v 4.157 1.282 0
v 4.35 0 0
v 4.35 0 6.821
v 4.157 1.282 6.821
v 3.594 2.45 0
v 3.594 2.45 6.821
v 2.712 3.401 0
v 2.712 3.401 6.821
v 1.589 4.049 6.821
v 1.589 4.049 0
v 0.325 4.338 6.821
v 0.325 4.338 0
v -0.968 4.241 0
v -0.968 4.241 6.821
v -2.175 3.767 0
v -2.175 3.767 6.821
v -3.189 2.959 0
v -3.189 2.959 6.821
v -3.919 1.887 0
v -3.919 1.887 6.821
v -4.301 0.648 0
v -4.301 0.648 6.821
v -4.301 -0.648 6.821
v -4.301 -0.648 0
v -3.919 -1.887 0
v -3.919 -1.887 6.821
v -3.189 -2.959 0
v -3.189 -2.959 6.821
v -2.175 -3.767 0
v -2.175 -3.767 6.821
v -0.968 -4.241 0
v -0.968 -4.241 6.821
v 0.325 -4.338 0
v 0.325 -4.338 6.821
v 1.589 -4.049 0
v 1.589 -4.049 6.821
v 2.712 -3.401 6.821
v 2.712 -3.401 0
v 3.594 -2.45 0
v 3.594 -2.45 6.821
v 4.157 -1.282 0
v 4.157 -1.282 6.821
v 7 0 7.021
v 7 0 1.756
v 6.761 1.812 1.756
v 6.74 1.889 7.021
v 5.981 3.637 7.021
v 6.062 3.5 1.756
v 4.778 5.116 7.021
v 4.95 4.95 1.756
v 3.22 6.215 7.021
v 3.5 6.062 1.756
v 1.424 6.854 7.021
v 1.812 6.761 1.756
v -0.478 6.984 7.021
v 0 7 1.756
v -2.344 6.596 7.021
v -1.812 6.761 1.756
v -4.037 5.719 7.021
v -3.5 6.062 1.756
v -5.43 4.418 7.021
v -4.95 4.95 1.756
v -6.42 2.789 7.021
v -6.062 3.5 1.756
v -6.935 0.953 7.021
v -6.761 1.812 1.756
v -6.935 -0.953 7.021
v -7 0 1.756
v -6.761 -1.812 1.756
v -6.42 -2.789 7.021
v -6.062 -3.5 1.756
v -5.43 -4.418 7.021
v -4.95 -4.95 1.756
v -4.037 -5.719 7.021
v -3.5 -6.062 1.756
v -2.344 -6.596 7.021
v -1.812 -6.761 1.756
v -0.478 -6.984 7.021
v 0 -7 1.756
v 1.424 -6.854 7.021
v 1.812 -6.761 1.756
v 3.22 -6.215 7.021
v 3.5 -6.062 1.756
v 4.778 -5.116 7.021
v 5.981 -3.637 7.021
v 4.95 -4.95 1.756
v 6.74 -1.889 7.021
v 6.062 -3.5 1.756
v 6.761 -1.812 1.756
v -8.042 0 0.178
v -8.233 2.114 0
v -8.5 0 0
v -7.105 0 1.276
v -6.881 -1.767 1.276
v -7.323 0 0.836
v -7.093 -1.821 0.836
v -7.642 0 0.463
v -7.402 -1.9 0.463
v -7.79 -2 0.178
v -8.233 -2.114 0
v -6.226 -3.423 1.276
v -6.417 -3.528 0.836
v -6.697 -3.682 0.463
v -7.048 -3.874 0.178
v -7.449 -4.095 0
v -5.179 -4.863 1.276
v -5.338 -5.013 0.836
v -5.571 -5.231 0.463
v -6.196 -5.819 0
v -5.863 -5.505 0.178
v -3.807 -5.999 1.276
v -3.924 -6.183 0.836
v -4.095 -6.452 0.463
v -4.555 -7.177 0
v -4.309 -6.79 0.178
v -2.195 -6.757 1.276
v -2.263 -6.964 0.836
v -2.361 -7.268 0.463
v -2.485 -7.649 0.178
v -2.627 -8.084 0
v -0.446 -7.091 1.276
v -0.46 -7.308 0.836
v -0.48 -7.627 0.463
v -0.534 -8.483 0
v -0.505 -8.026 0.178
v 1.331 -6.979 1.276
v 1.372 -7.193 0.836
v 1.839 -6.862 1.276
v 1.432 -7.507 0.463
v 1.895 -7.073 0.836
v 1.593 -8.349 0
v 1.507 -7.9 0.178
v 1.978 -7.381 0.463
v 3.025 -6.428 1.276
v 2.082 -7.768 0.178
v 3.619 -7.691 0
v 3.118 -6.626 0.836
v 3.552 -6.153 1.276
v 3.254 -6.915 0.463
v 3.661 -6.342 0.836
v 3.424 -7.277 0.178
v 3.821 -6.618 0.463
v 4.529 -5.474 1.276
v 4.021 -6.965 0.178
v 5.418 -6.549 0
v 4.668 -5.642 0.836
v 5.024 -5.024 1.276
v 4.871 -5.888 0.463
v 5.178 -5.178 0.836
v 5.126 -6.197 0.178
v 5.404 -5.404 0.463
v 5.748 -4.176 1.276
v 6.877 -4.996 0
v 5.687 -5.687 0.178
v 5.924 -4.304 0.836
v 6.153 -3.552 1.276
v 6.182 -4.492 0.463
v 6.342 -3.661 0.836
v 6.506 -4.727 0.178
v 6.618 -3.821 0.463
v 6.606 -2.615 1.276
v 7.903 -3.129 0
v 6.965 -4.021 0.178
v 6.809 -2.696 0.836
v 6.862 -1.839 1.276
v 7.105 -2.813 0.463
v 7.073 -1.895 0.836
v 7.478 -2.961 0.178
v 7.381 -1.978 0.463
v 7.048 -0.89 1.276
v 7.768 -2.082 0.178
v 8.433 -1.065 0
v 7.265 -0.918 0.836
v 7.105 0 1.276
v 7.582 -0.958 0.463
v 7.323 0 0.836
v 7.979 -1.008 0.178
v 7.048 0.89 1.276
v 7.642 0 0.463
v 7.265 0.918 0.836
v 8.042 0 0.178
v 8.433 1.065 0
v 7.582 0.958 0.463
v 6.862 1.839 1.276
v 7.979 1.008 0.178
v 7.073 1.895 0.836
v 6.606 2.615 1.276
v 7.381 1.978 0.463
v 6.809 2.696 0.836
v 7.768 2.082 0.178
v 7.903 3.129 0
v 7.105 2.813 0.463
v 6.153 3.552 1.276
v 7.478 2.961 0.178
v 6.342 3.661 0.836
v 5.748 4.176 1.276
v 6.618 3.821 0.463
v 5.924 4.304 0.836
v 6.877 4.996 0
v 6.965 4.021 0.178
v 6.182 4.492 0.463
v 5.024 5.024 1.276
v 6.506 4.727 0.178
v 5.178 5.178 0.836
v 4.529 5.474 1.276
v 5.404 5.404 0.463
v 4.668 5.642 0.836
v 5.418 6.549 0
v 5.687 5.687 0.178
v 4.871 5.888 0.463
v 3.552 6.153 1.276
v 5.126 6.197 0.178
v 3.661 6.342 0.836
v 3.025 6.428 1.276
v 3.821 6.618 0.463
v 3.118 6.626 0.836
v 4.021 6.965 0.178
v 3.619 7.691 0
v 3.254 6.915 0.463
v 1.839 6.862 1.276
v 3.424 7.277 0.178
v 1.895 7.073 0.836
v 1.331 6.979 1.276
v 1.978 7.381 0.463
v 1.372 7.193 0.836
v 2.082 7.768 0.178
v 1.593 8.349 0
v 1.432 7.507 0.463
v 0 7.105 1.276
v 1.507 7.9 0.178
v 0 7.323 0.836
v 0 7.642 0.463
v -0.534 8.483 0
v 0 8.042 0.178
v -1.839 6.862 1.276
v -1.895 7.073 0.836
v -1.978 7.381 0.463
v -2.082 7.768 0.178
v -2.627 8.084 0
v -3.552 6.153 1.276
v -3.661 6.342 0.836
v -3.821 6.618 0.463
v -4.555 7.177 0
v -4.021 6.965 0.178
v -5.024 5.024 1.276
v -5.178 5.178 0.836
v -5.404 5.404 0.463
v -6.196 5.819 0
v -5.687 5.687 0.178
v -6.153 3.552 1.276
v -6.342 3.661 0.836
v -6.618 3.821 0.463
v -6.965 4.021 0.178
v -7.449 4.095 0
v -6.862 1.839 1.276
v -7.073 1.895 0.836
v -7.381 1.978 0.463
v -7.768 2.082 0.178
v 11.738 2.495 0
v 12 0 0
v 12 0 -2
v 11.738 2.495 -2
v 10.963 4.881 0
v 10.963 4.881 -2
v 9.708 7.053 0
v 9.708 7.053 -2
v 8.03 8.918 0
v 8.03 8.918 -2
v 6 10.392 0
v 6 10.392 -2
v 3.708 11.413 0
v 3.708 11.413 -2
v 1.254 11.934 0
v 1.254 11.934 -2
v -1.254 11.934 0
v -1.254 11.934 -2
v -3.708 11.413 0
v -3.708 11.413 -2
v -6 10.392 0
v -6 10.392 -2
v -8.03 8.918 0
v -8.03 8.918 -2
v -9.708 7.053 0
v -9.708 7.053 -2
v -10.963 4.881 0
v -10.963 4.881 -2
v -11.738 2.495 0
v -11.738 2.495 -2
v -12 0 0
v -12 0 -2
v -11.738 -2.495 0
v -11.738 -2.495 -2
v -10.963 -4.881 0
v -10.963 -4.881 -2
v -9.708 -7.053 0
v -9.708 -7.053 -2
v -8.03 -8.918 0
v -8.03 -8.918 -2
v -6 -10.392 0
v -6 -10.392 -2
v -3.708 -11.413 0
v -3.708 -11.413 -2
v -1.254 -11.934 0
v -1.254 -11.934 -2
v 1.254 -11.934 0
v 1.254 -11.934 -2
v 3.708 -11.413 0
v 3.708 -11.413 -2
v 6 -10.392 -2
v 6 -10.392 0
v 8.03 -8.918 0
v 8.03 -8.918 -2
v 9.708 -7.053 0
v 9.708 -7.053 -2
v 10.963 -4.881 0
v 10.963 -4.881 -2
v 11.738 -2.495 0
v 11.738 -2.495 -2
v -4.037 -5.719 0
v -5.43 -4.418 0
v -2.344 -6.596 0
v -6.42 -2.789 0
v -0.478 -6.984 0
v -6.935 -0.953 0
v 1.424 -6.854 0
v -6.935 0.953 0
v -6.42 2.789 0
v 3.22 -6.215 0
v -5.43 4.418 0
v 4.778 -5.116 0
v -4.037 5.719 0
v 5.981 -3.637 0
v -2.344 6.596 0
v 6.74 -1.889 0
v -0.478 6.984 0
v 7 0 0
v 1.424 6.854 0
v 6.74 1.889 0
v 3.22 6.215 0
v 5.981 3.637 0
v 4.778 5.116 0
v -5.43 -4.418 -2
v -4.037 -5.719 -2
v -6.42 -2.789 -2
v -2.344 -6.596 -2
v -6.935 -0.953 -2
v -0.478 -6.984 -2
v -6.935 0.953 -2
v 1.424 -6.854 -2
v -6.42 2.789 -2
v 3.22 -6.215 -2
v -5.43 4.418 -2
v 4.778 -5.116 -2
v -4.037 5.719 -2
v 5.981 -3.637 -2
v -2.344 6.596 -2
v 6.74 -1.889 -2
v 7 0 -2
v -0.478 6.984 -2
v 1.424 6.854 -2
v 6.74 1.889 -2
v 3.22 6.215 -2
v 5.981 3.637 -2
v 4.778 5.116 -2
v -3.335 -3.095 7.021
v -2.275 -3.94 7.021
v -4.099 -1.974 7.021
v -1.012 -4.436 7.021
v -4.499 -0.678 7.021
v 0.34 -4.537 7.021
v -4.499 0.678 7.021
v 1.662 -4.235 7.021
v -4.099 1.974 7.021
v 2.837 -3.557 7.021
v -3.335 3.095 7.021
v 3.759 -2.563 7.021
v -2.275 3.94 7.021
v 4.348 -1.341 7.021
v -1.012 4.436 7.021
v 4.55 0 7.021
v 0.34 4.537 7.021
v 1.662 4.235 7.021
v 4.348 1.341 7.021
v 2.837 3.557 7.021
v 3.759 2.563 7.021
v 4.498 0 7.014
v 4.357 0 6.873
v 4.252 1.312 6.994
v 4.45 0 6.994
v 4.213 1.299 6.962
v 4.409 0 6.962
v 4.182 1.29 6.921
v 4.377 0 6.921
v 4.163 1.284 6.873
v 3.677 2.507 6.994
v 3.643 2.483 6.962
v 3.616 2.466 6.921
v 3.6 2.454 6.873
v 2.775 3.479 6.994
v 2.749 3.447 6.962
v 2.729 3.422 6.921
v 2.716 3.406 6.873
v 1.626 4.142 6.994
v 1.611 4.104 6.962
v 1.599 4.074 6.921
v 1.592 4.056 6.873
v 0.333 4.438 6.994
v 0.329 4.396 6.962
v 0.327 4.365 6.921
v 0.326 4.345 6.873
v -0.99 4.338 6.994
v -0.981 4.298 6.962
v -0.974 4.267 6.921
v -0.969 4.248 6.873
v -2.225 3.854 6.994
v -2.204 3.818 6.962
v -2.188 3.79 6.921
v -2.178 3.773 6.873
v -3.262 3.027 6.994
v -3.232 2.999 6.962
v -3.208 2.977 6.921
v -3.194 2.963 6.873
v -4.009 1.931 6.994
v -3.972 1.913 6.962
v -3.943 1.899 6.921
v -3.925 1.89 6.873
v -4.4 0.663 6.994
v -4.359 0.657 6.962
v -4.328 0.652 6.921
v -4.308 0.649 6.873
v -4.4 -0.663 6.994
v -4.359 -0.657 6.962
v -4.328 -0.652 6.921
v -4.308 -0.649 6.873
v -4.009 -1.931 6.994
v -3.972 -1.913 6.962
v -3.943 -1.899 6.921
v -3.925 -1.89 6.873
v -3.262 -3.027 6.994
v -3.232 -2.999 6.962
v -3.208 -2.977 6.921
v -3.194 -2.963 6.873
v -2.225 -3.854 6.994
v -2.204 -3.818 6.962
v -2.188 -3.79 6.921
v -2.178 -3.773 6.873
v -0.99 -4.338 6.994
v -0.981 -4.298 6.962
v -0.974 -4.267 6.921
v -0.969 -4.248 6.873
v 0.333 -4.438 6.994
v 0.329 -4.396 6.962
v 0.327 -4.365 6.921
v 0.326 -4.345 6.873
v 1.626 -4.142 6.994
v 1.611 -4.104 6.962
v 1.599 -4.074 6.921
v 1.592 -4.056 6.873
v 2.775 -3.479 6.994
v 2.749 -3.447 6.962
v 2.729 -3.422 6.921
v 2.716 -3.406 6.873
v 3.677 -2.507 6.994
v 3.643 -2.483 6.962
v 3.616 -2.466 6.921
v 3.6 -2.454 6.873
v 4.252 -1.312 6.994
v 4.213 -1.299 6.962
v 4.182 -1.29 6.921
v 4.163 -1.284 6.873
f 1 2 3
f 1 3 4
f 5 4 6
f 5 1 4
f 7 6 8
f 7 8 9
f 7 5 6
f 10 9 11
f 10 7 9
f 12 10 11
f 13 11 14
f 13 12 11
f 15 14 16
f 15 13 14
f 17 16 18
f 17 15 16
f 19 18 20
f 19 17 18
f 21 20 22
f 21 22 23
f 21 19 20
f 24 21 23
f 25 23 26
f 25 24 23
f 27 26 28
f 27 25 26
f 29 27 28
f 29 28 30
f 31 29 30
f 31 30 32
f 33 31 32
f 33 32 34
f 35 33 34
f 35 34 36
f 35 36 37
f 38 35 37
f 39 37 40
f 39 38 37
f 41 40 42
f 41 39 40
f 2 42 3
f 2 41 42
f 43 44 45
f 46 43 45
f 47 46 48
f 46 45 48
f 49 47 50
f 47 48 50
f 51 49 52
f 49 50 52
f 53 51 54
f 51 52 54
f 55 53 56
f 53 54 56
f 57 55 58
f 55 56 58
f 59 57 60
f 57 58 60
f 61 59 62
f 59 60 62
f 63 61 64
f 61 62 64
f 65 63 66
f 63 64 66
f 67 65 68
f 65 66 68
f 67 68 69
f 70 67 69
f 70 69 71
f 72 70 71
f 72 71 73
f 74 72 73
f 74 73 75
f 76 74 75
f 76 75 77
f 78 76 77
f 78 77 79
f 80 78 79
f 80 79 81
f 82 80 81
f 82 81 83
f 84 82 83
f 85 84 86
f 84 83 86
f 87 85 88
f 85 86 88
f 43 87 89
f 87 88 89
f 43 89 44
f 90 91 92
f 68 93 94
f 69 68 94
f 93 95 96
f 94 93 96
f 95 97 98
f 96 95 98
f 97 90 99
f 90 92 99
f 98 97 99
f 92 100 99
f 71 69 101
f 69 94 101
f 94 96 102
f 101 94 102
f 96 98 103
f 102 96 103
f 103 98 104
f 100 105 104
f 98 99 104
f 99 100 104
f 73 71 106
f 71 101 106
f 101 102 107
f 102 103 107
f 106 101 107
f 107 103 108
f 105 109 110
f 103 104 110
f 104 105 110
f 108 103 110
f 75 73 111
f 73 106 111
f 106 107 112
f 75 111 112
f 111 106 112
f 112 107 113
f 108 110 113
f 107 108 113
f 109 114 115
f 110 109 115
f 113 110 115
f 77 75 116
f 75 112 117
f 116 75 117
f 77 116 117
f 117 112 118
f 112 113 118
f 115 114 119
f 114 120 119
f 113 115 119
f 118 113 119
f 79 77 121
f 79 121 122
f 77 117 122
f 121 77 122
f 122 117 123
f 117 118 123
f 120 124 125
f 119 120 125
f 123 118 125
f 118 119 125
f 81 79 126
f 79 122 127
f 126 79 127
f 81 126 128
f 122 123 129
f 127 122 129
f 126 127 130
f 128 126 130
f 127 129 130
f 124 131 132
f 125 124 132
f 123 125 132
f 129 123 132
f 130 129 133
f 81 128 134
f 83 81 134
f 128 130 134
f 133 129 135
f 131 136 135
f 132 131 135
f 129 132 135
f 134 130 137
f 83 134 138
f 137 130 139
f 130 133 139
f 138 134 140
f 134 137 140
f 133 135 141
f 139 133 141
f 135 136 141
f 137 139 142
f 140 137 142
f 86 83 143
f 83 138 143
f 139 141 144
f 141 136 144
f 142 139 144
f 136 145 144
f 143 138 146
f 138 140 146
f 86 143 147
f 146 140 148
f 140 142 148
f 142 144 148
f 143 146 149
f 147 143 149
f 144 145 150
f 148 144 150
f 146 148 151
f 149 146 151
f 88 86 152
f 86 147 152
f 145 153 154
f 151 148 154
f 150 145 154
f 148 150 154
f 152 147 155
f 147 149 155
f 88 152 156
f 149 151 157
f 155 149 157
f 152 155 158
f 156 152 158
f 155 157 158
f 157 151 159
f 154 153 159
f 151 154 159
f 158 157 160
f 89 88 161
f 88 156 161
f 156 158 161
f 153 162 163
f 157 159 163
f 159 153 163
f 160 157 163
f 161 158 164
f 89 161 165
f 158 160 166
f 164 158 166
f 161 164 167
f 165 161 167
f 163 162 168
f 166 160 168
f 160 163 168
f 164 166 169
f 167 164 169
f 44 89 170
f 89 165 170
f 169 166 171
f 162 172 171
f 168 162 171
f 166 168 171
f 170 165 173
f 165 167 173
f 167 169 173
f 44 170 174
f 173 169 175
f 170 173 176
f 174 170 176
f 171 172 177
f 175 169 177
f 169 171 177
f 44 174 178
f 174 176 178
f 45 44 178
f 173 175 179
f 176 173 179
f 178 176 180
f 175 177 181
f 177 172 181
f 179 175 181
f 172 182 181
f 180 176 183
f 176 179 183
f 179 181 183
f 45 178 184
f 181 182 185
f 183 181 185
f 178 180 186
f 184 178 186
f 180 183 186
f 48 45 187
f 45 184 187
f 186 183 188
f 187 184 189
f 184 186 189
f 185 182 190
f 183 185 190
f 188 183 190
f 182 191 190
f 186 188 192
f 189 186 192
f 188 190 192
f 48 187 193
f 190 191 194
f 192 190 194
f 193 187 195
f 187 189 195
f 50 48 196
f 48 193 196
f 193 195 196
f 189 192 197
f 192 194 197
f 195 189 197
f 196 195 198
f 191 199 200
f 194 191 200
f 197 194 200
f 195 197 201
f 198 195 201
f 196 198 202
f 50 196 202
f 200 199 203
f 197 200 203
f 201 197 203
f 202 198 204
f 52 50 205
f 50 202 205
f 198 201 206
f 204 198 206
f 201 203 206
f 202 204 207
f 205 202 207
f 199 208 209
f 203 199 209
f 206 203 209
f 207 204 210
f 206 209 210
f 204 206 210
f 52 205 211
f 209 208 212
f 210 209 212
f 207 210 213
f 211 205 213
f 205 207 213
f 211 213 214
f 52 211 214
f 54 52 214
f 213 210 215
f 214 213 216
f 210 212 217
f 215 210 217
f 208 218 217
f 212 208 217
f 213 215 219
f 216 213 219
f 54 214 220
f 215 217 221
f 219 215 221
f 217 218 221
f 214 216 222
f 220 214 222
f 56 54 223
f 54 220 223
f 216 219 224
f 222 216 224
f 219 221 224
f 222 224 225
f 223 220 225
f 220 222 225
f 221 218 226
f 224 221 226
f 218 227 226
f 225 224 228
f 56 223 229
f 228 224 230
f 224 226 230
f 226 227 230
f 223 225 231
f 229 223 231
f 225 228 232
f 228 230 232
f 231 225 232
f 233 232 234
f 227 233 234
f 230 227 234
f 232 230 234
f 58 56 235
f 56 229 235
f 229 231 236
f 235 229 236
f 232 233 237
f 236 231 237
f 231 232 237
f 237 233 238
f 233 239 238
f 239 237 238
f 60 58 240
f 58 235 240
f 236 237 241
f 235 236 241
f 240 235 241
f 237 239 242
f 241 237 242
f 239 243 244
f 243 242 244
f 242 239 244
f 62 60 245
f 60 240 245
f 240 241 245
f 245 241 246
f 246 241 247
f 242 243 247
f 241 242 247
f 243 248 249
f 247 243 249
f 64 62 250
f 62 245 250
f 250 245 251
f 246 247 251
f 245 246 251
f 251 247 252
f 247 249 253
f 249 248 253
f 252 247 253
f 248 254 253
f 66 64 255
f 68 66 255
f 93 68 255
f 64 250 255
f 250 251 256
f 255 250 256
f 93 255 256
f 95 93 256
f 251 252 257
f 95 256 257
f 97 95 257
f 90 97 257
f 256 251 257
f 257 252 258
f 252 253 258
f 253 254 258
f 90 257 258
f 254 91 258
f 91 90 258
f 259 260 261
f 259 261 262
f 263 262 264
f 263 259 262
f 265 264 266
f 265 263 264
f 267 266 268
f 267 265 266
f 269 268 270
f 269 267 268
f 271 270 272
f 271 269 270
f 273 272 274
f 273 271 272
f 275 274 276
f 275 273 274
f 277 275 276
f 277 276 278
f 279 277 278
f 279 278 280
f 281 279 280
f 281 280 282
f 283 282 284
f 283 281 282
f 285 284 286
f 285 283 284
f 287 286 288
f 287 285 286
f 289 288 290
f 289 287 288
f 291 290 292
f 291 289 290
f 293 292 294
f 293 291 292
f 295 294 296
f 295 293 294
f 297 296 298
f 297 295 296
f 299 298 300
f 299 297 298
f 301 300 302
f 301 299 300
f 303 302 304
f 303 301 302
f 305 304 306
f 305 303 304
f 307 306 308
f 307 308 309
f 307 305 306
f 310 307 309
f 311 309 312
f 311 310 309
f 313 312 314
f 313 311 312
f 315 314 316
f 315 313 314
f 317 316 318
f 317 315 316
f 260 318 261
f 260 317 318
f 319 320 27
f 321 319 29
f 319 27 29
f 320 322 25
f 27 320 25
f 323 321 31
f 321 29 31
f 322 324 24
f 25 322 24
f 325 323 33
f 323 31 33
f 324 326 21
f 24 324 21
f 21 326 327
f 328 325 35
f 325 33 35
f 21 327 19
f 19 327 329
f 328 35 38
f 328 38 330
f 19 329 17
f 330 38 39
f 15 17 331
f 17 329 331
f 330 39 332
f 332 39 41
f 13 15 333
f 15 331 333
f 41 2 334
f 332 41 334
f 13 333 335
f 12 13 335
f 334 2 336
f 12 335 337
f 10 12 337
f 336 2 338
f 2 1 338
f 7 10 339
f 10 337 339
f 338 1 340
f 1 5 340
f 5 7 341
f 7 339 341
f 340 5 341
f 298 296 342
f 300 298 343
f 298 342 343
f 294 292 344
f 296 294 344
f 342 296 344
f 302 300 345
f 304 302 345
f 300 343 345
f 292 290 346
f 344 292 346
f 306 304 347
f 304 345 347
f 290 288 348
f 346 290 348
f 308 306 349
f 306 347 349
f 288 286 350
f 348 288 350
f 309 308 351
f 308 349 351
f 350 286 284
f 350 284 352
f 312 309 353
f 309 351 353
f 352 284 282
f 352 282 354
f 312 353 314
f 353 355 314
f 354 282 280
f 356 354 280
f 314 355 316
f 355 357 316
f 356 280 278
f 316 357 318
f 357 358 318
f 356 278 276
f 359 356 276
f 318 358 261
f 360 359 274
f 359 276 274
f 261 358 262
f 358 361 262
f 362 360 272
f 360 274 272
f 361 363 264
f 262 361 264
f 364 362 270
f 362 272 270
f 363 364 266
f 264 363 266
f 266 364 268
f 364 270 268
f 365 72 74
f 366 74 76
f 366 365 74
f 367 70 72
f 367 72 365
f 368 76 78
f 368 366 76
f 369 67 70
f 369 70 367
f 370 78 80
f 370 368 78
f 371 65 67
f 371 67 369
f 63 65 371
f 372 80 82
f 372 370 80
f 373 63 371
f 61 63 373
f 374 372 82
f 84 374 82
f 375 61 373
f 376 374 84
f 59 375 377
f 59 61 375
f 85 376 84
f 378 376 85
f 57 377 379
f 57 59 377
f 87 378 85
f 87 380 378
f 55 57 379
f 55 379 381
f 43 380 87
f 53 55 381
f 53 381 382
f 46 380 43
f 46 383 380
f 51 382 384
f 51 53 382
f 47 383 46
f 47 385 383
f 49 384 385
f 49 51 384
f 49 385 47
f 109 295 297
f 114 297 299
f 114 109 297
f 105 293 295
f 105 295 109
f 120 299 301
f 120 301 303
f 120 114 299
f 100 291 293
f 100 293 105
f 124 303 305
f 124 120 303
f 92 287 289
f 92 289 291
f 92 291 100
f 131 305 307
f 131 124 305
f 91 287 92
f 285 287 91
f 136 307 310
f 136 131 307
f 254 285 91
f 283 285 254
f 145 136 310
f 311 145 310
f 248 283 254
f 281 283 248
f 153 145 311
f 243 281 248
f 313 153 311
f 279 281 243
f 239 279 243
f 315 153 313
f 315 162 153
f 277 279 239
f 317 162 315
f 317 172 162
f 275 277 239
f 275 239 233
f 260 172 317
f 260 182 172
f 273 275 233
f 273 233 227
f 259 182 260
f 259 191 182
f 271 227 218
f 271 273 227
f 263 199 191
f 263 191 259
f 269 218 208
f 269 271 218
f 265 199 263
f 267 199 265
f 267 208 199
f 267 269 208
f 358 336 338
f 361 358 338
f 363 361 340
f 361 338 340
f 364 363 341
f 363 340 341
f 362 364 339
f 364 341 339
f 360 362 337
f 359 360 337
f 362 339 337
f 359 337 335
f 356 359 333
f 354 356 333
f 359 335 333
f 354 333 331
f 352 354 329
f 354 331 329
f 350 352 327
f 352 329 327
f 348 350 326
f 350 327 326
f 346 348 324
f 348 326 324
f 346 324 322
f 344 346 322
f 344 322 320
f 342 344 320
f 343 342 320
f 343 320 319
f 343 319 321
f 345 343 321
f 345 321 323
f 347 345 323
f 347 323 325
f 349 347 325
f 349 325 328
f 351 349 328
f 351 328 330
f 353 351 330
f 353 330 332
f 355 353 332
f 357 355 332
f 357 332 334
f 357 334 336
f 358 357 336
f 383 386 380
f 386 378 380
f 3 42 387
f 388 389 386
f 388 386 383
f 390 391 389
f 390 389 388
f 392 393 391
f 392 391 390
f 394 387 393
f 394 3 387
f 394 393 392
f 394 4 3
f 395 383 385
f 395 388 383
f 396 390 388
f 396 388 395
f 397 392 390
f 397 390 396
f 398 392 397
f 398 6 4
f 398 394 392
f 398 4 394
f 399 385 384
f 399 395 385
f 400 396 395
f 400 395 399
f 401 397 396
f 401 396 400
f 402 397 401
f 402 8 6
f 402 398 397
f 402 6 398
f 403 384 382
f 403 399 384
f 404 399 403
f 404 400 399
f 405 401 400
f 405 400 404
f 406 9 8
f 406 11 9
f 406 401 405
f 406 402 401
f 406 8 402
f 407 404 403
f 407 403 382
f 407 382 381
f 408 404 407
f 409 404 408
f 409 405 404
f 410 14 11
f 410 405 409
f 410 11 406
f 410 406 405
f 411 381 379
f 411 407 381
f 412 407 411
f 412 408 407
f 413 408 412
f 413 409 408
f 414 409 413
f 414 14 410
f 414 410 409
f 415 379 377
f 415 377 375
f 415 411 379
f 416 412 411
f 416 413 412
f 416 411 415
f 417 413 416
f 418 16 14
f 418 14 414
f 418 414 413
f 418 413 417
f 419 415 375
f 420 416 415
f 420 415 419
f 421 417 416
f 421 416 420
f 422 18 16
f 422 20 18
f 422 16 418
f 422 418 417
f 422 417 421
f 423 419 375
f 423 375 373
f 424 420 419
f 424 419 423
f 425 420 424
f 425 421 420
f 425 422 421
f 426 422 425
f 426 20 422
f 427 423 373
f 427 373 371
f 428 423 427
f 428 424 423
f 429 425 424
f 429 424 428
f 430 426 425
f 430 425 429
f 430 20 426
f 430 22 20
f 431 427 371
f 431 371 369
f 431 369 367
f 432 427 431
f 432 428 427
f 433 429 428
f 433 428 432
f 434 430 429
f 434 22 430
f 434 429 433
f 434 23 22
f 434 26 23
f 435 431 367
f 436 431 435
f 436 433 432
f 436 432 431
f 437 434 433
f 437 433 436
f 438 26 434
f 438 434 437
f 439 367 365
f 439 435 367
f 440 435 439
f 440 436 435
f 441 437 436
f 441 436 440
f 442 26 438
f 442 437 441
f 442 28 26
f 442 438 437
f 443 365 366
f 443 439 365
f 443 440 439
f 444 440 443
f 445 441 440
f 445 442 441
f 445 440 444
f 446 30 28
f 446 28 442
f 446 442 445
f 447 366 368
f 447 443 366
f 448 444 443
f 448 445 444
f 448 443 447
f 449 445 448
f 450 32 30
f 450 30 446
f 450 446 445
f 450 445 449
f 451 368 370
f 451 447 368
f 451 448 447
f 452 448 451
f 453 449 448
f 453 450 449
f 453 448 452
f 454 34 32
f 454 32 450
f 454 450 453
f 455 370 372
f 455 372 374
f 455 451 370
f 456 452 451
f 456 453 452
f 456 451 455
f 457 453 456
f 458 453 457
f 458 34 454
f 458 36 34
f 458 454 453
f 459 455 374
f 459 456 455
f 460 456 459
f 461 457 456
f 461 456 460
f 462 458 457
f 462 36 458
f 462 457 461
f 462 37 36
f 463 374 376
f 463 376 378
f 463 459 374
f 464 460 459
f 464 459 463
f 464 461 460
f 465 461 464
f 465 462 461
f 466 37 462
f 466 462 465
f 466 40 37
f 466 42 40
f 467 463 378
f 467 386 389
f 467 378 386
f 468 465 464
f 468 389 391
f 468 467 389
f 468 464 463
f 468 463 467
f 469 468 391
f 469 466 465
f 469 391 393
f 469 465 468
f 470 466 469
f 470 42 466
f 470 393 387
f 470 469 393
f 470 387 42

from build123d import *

# Parameters (mm, degrees)
F0_R     = 12
F0_R_2   = 7
F1_DEPTH = 2
F0_R_3   = 4.35
F2_DEPTH = 7.021
F8_R     = 0.2


with BuildPart() as f1:
    # F0 (on Top) → F1 (new body)
    with BuildSketch(Plane.XY):
        Circle(F0_R)
        Circle(F0_R_2, mode=Mode.SUBTRACT)
    extrude(amount=-F1_DEPTH)

    # F0 (on Top) → F2 (join)
    with BuildSketch(Plane.XY):
        Circle(F0_R_2)
        Circle(F0_R_3, mode=Mode.SUBTRACT)
    extrude(amount=F2_DEPTH)

    # F6 (on Front) → F7 (revolve)
    with BuildSketch(Plane.XZ):
        with BuildLine():
            ThreePointArc((-7, 1.7562480825), (-7.4708650568, 0.639716712), (-8.5, 0))
            Line((-8.5, 0), (-7, 0))
            Line((-7, 0), (-7, 1.7562480825))
        make_face()
    revolve(axis=Axis((0, 0, 5.6352536849), (0, 0, 1)))

    # F8
    f8_edges = [f1.edges().sort_by_distance(p)[0] for p in [
        (-4.35, 0, 7.021),
    ]]
    fillet(f8_edges, radius=F8_R)


solid = f1.part
